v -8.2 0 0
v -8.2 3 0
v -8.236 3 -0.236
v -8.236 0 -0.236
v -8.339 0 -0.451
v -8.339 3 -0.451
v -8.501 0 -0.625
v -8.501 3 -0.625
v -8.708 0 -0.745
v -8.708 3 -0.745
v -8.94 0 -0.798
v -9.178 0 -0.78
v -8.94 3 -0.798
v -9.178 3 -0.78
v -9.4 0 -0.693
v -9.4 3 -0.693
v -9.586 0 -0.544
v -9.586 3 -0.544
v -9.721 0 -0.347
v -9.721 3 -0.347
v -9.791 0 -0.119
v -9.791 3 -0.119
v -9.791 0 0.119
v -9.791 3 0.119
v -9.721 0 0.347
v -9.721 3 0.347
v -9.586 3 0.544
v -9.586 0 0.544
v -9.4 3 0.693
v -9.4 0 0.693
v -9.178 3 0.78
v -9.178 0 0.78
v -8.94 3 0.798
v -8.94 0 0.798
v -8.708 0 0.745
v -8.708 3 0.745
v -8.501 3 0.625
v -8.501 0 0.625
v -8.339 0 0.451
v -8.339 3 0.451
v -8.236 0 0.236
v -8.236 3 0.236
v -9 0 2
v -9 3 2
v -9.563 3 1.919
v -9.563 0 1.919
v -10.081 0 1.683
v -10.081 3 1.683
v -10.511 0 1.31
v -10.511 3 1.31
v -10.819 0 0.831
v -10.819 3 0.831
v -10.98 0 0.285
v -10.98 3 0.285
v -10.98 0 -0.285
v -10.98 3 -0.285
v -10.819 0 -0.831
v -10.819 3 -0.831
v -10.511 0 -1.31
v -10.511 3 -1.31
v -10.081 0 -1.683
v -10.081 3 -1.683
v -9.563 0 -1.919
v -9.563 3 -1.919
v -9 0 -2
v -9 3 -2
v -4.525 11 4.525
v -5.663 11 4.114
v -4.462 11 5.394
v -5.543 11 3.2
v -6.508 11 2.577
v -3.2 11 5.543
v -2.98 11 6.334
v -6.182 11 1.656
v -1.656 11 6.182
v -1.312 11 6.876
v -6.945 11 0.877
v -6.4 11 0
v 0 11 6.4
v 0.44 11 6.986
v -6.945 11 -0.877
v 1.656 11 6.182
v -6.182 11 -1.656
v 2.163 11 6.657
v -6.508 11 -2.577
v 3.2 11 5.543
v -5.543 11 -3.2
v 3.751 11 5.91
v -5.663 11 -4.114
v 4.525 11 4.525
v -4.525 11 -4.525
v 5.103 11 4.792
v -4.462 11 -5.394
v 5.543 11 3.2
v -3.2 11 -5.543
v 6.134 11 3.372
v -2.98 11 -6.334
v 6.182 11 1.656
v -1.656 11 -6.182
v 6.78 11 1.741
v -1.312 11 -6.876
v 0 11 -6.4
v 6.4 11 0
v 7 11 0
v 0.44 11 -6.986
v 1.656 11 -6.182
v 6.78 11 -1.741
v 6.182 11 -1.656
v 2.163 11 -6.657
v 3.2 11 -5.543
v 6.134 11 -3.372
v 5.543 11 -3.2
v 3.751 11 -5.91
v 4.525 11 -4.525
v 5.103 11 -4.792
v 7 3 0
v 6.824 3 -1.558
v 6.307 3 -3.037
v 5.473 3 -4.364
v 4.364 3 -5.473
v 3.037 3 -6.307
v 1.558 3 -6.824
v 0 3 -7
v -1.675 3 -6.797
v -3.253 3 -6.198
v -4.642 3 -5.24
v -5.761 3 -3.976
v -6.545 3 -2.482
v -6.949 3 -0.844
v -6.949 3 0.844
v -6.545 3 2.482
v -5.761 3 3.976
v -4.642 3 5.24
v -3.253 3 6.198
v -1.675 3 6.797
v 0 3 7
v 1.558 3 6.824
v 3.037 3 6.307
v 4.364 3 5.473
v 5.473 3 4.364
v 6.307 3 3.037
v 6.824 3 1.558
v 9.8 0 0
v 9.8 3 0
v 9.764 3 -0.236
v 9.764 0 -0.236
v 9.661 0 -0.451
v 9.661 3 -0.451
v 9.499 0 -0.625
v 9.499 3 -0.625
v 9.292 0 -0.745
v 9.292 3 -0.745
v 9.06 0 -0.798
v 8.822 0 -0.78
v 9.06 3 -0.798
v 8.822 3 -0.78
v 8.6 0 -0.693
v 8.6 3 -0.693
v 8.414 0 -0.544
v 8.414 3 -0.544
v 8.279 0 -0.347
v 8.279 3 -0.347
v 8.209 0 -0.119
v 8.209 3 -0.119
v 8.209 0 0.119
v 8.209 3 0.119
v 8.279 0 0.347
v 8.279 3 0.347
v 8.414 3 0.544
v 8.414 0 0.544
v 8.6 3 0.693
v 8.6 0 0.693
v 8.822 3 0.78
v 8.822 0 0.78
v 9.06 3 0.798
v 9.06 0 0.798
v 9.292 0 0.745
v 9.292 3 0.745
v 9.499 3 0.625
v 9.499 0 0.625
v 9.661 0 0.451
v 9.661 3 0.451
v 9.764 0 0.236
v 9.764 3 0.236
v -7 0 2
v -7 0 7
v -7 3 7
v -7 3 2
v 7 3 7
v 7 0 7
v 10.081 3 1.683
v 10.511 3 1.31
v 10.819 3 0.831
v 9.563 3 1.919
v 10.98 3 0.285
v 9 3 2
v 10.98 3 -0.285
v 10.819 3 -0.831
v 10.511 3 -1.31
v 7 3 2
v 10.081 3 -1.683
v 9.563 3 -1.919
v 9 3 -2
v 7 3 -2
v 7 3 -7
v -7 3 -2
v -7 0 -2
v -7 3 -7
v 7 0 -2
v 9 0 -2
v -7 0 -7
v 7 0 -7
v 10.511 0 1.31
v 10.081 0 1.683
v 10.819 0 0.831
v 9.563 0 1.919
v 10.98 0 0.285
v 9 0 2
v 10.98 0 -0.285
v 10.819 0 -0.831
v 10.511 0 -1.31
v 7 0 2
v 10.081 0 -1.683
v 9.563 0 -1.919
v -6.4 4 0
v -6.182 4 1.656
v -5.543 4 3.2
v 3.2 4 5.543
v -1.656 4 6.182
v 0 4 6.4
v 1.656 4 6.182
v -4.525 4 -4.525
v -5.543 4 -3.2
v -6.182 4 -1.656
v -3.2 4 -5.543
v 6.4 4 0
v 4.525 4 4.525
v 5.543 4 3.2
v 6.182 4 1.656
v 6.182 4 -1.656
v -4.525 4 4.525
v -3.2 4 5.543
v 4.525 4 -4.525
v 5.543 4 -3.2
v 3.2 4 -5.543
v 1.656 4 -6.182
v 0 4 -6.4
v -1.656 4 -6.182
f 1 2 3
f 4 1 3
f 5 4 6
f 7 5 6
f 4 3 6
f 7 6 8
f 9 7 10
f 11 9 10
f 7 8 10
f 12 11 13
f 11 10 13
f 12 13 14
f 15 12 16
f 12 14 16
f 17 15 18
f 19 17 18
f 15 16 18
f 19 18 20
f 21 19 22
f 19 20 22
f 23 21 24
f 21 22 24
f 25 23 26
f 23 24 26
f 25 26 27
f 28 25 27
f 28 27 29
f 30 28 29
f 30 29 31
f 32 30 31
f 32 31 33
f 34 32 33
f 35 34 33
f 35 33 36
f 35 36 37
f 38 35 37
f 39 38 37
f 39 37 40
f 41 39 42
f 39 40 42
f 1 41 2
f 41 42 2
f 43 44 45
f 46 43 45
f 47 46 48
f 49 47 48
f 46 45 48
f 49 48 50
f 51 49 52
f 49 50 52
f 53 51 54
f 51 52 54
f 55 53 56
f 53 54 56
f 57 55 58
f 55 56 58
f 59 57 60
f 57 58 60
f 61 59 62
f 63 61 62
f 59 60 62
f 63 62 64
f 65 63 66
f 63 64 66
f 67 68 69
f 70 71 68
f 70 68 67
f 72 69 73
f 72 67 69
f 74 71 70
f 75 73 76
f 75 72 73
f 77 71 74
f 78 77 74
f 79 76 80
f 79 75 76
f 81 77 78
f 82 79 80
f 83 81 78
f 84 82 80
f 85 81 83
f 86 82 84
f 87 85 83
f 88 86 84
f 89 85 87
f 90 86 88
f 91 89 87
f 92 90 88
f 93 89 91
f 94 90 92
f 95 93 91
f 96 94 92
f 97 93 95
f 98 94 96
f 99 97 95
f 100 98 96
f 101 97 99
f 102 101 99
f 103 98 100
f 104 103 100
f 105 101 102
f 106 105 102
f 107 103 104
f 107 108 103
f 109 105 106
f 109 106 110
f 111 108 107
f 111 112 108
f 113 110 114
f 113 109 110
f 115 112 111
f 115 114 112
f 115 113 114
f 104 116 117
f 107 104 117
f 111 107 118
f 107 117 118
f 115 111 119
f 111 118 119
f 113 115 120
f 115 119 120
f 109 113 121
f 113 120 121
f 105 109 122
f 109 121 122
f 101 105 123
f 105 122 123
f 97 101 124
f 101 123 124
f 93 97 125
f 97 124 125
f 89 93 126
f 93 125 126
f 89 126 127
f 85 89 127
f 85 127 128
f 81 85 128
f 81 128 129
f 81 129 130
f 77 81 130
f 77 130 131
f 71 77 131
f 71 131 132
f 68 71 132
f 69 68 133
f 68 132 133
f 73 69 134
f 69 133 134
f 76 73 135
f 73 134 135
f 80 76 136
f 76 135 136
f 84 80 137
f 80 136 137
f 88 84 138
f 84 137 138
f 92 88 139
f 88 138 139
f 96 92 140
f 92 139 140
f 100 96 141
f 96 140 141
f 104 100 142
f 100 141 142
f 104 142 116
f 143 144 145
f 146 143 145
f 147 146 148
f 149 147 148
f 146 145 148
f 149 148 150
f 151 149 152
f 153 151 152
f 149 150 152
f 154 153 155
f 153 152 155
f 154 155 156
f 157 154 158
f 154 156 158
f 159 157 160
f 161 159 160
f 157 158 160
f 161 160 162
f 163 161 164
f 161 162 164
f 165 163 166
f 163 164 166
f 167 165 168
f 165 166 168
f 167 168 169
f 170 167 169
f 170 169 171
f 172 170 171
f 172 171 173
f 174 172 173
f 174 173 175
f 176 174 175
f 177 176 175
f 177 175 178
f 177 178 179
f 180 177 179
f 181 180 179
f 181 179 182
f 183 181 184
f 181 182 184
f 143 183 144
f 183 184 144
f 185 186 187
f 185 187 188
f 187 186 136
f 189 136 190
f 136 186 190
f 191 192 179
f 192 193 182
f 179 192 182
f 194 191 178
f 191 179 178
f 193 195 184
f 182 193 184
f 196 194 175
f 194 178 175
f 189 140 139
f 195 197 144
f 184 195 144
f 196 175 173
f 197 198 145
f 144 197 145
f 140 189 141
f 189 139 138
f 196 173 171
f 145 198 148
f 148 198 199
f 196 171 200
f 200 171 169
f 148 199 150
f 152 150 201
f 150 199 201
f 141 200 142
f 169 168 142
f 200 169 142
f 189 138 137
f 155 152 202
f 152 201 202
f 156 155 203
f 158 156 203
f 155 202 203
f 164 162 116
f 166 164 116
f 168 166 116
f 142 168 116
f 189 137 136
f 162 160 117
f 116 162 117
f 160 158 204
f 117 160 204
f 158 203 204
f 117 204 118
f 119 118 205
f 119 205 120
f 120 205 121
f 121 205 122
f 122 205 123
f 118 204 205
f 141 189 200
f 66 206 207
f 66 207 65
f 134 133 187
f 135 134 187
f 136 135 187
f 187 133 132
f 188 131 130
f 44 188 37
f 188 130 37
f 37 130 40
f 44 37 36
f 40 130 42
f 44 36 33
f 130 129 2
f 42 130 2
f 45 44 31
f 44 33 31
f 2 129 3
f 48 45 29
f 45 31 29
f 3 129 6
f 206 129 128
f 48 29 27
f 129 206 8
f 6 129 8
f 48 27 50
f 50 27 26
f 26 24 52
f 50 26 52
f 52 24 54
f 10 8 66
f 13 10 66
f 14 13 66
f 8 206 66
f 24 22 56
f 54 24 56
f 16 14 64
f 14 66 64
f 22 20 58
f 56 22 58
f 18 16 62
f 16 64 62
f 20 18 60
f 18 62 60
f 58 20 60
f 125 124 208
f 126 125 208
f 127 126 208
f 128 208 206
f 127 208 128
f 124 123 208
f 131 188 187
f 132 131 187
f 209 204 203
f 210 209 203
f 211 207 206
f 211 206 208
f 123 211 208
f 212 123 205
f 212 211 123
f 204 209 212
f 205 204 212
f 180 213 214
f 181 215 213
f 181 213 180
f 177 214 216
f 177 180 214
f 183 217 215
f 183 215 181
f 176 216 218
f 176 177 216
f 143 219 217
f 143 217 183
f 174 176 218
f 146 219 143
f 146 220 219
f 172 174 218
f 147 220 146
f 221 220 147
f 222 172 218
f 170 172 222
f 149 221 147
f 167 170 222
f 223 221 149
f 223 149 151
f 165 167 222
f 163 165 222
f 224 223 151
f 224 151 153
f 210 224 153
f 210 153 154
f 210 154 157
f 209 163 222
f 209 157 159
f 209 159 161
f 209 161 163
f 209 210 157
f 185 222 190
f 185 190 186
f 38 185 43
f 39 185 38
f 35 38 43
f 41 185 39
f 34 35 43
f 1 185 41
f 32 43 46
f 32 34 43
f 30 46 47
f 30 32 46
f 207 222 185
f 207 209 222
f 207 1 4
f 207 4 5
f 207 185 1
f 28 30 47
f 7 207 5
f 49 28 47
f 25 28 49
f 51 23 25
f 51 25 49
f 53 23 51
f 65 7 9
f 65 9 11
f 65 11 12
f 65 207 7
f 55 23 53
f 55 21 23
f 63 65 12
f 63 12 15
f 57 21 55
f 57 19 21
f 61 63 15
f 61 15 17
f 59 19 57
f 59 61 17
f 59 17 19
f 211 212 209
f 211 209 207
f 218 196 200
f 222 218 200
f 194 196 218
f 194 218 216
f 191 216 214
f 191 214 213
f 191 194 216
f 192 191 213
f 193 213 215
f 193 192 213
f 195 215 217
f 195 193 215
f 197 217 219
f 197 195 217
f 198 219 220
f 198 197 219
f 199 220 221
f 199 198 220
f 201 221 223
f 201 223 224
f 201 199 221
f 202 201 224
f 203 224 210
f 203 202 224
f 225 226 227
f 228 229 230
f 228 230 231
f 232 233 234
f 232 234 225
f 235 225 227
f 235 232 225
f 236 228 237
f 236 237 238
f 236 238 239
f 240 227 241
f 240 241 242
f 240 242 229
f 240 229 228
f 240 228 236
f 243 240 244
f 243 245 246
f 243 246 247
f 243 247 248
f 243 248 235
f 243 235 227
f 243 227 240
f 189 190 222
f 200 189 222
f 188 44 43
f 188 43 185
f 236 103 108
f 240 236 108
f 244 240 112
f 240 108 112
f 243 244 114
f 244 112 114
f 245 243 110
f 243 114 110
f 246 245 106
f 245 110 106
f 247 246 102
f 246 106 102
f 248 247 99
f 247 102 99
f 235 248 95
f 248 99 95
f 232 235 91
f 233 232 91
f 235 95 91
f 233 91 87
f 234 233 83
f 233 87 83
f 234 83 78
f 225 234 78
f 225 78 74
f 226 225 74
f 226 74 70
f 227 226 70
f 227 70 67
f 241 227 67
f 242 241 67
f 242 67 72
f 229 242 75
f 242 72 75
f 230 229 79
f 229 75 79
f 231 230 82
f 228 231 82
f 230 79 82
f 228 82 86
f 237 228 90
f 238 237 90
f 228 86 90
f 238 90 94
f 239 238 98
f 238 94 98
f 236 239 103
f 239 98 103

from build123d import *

# Parameters (mm, degrees)
SKETCH_1_W          = 14
SKETCH_1_H          = 14
EXTRUDE_2_DEPTH     = 3
EXTRUDE_4_DEPTH     = 3
EXTRUDE_5_DEPTH     = 3
SKETCH_4_R          = 0.8
CUT_EXTRUDE_1_DEPTH = 3
SKETCH_5_R          = 7
EXTRUDE_6_DEPTH     = 8
SKETCH_6_R          = 6.4
CUT_EXTRUDE_2_DEPTH = 7


with BuildPart() as part:
    # 草图1 → 凸台-拉伸2 (new body)
    with BuildSketch(Plane(origin=(0, 0, 0), x_dir=(1, 0, 0), z_dir=(0, 1, 0))):
        Rectangle(SKETCH_1_W, SKETCH_1_H)
    extrude(amount=EXTRUDE_2_DEPTH)

    # 草图2 → 凸台-拉伸4 (add)
    with BuildSketch(Plane(origin=(0, 3, 0), x_dir=(1, 0, 0), z_dir=(0, 1, 0))):
        Polygon((-7, 0), (-7, 2), (-9, 2), (-9, 0), (-9, -2), (-7, -2), align=None)
        Polygon((7, 0), (7, 2), (9, 2), (9, 0), (9, -2), (7, -2), align=None)
    extrude(amount=-EXTRUDE_4_DEPTH)

    # 草图3 → 凸台-拉伸5 (add)
    with BuildSketch(Plane(origin=(0, 3, 0), x_dir=(1, 0, 0), z_dir=(0, 1, 0))):
        with BuildLine():
            Line((-9, 2), (-9, -2))
            ThreePointArc((-9, -2), (-11, 0), (-9, 2))
        make_face()
        with BuildLine():
            Line((9, 2), (9, -2))
            ThreePointArc((9, -2), (11, 0), (9, 2))
        make_face()
    extrude(amount=-EXTRUDE_5_DEPTH)

    # 草图4 → 切除-拉伸1 (cut)
    with BuildSketch(Plane(origin=(0, 3, 0), x_dir=(1, 0, 0), z_dir=(0, 1, 0))):
        with Locations((-9, 0)):
            Circle(SKETCH_4_R)
        with Locations((9, 0)):
            Circle(SKETCH_4_R)
    extrude(amount=-CUT_EXTRUDE_1_DEPTH, mode=Mode.SUBTRACT)

    # 草图5 → 凸台-拉伸6 (add)
    with BuildSketch(Plane(origin=(0, 3, 0), x_dir=(1, 0, 0), z_dir=(0, 1, 0))):
        Circle(SKETCH_5_R)
    extrude(amount=EXTRUDE_6_DEPTH)

    # 草图6 → 切除-拉伸2 (cut)
    with BuildSketch(Plane(origin=(0, 11, 0), x_dir=(1, 0, 0), z_dir=(0, 1, 0))):
        Circle(SKETCH_6_R)
    extrude(amount=-CUT_EXTRUDE_2_DEPTH, mode=Mode.SUBTRACT)


solid = part.part
